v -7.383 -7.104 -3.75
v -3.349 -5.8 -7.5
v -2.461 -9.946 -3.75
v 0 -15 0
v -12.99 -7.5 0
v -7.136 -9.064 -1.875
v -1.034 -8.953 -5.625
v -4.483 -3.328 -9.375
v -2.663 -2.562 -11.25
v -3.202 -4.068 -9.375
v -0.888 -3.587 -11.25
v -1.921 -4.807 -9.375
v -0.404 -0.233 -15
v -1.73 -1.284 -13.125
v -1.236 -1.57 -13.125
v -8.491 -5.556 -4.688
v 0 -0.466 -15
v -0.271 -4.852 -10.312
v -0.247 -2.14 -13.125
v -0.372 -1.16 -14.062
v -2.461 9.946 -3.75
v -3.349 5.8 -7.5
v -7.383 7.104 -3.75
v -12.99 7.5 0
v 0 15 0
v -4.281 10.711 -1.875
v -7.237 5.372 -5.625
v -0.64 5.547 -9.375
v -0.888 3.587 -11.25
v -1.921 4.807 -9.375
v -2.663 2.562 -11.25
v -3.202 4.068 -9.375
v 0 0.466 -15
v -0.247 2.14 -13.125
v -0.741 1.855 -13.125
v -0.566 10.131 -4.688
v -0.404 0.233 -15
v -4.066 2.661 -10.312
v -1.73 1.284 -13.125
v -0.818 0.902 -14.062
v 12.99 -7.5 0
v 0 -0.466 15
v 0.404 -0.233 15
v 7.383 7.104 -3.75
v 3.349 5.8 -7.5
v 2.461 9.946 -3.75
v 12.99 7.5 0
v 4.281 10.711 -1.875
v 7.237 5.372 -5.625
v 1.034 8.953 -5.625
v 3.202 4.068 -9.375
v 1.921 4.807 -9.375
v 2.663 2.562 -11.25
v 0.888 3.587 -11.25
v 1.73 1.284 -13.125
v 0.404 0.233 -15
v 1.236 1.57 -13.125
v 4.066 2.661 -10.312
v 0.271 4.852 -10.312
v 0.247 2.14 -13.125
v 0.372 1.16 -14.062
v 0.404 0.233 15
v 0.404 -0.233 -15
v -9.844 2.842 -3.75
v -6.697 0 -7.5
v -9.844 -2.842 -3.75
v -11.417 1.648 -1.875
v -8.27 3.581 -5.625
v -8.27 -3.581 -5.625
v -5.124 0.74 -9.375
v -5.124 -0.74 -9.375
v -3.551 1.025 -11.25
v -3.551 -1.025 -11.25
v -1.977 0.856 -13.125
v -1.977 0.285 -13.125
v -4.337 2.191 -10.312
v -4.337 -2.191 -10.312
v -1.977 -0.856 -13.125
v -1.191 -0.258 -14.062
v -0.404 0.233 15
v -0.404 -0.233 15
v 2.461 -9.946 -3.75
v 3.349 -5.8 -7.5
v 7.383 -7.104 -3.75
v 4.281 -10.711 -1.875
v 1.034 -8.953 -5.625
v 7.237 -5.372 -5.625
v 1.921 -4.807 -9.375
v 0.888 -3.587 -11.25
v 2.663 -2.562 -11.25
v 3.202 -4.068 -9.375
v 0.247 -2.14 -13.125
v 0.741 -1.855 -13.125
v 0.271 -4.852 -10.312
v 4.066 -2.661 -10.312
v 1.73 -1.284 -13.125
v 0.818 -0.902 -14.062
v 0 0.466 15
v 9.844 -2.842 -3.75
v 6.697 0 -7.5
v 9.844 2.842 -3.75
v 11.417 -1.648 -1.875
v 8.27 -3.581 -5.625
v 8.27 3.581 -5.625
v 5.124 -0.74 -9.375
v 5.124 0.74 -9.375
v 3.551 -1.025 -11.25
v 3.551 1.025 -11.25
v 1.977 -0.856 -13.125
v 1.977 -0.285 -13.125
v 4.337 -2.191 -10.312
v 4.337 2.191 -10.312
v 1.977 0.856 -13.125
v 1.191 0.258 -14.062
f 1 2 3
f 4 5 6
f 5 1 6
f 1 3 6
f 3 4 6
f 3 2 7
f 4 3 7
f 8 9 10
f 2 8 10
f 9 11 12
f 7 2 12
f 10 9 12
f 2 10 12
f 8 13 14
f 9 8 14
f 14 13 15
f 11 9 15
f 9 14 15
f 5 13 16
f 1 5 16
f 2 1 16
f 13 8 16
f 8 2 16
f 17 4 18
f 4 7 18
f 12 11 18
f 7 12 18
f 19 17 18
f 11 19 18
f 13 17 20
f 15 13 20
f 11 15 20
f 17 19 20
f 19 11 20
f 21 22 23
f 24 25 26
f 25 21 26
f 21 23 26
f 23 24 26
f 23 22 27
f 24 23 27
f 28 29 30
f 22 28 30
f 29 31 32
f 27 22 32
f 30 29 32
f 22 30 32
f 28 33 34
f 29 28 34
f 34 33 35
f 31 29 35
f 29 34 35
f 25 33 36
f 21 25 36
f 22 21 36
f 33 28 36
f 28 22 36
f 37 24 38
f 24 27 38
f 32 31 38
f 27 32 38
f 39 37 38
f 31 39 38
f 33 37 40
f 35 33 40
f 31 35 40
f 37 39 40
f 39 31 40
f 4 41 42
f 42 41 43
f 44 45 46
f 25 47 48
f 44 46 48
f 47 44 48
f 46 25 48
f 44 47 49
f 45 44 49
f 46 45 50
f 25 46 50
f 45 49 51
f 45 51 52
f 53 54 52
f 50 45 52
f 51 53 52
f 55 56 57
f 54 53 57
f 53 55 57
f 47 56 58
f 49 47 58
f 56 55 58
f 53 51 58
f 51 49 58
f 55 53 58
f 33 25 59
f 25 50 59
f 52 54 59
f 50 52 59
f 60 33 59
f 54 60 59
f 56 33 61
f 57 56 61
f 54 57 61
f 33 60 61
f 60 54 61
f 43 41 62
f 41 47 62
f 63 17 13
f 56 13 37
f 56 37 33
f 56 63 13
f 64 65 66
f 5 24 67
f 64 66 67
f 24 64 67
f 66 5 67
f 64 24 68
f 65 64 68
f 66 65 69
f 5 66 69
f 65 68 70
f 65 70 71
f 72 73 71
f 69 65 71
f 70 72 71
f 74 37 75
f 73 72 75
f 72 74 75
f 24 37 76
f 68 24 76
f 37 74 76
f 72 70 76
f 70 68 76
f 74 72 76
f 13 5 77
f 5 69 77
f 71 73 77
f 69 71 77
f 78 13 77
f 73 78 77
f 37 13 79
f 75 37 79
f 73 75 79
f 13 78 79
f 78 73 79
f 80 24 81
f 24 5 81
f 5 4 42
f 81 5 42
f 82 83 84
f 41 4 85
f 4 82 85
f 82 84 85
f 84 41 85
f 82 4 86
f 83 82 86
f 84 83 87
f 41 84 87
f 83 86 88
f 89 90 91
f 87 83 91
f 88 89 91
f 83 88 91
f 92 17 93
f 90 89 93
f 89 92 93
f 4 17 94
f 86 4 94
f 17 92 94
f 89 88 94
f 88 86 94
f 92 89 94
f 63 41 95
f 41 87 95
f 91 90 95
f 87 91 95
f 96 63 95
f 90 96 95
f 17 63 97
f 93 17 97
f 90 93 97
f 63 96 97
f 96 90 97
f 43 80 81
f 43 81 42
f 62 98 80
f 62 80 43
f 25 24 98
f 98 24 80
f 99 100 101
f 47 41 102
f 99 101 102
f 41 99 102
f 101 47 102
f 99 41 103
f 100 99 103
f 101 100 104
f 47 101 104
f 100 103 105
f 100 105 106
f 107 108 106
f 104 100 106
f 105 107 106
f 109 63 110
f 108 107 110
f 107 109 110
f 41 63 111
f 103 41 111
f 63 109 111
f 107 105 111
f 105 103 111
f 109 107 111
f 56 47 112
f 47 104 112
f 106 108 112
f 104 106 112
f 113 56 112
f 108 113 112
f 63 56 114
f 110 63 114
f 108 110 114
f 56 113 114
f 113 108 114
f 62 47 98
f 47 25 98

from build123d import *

# Parameters (mm, degrees)
PAD_DEPTH = 15
PAD_TAPER = 40


with BuildPart() as part:
    # Sketch (on XY_Plane of Origin) → Pad (new body, symmetric)
    with BuildSketch(Plane.XY):
        Polygon((0, -15), (12.990381, -7.5), (12.990381, 7.5), (0, 15), (-12.990381, 7.5), (-12.990381, -7.5), align=None)
    extrude(amount=PAD_DEPTH, both=True, taper=PAD_TAPER)


solid = part.part
